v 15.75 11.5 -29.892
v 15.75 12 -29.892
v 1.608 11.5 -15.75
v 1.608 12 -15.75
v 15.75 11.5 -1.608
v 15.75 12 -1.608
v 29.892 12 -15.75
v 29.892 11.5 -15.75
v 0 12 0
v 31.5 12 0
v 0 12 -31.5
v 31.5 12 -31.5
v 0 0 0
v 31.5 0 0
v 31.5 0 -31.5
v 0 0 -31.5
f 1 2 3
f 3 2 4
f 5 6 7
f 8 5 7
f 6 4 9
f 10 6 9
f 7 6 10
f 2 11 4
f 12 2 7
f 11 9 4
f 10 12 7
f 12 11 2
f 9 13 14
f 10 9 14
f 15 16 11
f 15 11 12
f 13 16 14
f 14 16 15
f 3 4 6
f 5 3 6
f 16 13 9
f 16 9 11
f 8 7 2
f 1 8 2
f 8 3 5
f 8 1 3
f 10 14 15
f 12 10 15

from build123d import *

# Parameters (mm, degrees)
SKETCH1_W           = 31.5
SKETCH1_H           = 31.5
BOSS_EXTRUDE1_DEPTH = 12
CUT_EXTRUDE1_DEPTH  = 0.5


with BuildPart() as part:
    # Sketch1 → Boss-Extrude1 (new body)
    with BuildSketch(Plane(origin=(0, 0, 0), x_dir=(1, 0, 0), z_dir=(0, 1, 0))):
        with Locations((15.75, 15.75)):
            Rectangle(SKETCH1_W, SKETCH1_H)
    extrude(amount=BOSS_EXTRUDE1_DEPTH)

    # Sketch3 → Cut-Extrude1 (cut)
    with BuildSketch(Plane(origin=(0, 12, 0), x_dir=(1, 0, 0), z_dir=(0, 1, 0))):
        Polygon((1.607864376, 15.75), (15.75, 1.607864376), (29.892135624, 15.75), (15.75, 29.892135624), align=None)
    extrude(amount=-CUT_EXTRUDE1_DEPTH, mode=Mode.SUBTRACT)


solid = part.part
